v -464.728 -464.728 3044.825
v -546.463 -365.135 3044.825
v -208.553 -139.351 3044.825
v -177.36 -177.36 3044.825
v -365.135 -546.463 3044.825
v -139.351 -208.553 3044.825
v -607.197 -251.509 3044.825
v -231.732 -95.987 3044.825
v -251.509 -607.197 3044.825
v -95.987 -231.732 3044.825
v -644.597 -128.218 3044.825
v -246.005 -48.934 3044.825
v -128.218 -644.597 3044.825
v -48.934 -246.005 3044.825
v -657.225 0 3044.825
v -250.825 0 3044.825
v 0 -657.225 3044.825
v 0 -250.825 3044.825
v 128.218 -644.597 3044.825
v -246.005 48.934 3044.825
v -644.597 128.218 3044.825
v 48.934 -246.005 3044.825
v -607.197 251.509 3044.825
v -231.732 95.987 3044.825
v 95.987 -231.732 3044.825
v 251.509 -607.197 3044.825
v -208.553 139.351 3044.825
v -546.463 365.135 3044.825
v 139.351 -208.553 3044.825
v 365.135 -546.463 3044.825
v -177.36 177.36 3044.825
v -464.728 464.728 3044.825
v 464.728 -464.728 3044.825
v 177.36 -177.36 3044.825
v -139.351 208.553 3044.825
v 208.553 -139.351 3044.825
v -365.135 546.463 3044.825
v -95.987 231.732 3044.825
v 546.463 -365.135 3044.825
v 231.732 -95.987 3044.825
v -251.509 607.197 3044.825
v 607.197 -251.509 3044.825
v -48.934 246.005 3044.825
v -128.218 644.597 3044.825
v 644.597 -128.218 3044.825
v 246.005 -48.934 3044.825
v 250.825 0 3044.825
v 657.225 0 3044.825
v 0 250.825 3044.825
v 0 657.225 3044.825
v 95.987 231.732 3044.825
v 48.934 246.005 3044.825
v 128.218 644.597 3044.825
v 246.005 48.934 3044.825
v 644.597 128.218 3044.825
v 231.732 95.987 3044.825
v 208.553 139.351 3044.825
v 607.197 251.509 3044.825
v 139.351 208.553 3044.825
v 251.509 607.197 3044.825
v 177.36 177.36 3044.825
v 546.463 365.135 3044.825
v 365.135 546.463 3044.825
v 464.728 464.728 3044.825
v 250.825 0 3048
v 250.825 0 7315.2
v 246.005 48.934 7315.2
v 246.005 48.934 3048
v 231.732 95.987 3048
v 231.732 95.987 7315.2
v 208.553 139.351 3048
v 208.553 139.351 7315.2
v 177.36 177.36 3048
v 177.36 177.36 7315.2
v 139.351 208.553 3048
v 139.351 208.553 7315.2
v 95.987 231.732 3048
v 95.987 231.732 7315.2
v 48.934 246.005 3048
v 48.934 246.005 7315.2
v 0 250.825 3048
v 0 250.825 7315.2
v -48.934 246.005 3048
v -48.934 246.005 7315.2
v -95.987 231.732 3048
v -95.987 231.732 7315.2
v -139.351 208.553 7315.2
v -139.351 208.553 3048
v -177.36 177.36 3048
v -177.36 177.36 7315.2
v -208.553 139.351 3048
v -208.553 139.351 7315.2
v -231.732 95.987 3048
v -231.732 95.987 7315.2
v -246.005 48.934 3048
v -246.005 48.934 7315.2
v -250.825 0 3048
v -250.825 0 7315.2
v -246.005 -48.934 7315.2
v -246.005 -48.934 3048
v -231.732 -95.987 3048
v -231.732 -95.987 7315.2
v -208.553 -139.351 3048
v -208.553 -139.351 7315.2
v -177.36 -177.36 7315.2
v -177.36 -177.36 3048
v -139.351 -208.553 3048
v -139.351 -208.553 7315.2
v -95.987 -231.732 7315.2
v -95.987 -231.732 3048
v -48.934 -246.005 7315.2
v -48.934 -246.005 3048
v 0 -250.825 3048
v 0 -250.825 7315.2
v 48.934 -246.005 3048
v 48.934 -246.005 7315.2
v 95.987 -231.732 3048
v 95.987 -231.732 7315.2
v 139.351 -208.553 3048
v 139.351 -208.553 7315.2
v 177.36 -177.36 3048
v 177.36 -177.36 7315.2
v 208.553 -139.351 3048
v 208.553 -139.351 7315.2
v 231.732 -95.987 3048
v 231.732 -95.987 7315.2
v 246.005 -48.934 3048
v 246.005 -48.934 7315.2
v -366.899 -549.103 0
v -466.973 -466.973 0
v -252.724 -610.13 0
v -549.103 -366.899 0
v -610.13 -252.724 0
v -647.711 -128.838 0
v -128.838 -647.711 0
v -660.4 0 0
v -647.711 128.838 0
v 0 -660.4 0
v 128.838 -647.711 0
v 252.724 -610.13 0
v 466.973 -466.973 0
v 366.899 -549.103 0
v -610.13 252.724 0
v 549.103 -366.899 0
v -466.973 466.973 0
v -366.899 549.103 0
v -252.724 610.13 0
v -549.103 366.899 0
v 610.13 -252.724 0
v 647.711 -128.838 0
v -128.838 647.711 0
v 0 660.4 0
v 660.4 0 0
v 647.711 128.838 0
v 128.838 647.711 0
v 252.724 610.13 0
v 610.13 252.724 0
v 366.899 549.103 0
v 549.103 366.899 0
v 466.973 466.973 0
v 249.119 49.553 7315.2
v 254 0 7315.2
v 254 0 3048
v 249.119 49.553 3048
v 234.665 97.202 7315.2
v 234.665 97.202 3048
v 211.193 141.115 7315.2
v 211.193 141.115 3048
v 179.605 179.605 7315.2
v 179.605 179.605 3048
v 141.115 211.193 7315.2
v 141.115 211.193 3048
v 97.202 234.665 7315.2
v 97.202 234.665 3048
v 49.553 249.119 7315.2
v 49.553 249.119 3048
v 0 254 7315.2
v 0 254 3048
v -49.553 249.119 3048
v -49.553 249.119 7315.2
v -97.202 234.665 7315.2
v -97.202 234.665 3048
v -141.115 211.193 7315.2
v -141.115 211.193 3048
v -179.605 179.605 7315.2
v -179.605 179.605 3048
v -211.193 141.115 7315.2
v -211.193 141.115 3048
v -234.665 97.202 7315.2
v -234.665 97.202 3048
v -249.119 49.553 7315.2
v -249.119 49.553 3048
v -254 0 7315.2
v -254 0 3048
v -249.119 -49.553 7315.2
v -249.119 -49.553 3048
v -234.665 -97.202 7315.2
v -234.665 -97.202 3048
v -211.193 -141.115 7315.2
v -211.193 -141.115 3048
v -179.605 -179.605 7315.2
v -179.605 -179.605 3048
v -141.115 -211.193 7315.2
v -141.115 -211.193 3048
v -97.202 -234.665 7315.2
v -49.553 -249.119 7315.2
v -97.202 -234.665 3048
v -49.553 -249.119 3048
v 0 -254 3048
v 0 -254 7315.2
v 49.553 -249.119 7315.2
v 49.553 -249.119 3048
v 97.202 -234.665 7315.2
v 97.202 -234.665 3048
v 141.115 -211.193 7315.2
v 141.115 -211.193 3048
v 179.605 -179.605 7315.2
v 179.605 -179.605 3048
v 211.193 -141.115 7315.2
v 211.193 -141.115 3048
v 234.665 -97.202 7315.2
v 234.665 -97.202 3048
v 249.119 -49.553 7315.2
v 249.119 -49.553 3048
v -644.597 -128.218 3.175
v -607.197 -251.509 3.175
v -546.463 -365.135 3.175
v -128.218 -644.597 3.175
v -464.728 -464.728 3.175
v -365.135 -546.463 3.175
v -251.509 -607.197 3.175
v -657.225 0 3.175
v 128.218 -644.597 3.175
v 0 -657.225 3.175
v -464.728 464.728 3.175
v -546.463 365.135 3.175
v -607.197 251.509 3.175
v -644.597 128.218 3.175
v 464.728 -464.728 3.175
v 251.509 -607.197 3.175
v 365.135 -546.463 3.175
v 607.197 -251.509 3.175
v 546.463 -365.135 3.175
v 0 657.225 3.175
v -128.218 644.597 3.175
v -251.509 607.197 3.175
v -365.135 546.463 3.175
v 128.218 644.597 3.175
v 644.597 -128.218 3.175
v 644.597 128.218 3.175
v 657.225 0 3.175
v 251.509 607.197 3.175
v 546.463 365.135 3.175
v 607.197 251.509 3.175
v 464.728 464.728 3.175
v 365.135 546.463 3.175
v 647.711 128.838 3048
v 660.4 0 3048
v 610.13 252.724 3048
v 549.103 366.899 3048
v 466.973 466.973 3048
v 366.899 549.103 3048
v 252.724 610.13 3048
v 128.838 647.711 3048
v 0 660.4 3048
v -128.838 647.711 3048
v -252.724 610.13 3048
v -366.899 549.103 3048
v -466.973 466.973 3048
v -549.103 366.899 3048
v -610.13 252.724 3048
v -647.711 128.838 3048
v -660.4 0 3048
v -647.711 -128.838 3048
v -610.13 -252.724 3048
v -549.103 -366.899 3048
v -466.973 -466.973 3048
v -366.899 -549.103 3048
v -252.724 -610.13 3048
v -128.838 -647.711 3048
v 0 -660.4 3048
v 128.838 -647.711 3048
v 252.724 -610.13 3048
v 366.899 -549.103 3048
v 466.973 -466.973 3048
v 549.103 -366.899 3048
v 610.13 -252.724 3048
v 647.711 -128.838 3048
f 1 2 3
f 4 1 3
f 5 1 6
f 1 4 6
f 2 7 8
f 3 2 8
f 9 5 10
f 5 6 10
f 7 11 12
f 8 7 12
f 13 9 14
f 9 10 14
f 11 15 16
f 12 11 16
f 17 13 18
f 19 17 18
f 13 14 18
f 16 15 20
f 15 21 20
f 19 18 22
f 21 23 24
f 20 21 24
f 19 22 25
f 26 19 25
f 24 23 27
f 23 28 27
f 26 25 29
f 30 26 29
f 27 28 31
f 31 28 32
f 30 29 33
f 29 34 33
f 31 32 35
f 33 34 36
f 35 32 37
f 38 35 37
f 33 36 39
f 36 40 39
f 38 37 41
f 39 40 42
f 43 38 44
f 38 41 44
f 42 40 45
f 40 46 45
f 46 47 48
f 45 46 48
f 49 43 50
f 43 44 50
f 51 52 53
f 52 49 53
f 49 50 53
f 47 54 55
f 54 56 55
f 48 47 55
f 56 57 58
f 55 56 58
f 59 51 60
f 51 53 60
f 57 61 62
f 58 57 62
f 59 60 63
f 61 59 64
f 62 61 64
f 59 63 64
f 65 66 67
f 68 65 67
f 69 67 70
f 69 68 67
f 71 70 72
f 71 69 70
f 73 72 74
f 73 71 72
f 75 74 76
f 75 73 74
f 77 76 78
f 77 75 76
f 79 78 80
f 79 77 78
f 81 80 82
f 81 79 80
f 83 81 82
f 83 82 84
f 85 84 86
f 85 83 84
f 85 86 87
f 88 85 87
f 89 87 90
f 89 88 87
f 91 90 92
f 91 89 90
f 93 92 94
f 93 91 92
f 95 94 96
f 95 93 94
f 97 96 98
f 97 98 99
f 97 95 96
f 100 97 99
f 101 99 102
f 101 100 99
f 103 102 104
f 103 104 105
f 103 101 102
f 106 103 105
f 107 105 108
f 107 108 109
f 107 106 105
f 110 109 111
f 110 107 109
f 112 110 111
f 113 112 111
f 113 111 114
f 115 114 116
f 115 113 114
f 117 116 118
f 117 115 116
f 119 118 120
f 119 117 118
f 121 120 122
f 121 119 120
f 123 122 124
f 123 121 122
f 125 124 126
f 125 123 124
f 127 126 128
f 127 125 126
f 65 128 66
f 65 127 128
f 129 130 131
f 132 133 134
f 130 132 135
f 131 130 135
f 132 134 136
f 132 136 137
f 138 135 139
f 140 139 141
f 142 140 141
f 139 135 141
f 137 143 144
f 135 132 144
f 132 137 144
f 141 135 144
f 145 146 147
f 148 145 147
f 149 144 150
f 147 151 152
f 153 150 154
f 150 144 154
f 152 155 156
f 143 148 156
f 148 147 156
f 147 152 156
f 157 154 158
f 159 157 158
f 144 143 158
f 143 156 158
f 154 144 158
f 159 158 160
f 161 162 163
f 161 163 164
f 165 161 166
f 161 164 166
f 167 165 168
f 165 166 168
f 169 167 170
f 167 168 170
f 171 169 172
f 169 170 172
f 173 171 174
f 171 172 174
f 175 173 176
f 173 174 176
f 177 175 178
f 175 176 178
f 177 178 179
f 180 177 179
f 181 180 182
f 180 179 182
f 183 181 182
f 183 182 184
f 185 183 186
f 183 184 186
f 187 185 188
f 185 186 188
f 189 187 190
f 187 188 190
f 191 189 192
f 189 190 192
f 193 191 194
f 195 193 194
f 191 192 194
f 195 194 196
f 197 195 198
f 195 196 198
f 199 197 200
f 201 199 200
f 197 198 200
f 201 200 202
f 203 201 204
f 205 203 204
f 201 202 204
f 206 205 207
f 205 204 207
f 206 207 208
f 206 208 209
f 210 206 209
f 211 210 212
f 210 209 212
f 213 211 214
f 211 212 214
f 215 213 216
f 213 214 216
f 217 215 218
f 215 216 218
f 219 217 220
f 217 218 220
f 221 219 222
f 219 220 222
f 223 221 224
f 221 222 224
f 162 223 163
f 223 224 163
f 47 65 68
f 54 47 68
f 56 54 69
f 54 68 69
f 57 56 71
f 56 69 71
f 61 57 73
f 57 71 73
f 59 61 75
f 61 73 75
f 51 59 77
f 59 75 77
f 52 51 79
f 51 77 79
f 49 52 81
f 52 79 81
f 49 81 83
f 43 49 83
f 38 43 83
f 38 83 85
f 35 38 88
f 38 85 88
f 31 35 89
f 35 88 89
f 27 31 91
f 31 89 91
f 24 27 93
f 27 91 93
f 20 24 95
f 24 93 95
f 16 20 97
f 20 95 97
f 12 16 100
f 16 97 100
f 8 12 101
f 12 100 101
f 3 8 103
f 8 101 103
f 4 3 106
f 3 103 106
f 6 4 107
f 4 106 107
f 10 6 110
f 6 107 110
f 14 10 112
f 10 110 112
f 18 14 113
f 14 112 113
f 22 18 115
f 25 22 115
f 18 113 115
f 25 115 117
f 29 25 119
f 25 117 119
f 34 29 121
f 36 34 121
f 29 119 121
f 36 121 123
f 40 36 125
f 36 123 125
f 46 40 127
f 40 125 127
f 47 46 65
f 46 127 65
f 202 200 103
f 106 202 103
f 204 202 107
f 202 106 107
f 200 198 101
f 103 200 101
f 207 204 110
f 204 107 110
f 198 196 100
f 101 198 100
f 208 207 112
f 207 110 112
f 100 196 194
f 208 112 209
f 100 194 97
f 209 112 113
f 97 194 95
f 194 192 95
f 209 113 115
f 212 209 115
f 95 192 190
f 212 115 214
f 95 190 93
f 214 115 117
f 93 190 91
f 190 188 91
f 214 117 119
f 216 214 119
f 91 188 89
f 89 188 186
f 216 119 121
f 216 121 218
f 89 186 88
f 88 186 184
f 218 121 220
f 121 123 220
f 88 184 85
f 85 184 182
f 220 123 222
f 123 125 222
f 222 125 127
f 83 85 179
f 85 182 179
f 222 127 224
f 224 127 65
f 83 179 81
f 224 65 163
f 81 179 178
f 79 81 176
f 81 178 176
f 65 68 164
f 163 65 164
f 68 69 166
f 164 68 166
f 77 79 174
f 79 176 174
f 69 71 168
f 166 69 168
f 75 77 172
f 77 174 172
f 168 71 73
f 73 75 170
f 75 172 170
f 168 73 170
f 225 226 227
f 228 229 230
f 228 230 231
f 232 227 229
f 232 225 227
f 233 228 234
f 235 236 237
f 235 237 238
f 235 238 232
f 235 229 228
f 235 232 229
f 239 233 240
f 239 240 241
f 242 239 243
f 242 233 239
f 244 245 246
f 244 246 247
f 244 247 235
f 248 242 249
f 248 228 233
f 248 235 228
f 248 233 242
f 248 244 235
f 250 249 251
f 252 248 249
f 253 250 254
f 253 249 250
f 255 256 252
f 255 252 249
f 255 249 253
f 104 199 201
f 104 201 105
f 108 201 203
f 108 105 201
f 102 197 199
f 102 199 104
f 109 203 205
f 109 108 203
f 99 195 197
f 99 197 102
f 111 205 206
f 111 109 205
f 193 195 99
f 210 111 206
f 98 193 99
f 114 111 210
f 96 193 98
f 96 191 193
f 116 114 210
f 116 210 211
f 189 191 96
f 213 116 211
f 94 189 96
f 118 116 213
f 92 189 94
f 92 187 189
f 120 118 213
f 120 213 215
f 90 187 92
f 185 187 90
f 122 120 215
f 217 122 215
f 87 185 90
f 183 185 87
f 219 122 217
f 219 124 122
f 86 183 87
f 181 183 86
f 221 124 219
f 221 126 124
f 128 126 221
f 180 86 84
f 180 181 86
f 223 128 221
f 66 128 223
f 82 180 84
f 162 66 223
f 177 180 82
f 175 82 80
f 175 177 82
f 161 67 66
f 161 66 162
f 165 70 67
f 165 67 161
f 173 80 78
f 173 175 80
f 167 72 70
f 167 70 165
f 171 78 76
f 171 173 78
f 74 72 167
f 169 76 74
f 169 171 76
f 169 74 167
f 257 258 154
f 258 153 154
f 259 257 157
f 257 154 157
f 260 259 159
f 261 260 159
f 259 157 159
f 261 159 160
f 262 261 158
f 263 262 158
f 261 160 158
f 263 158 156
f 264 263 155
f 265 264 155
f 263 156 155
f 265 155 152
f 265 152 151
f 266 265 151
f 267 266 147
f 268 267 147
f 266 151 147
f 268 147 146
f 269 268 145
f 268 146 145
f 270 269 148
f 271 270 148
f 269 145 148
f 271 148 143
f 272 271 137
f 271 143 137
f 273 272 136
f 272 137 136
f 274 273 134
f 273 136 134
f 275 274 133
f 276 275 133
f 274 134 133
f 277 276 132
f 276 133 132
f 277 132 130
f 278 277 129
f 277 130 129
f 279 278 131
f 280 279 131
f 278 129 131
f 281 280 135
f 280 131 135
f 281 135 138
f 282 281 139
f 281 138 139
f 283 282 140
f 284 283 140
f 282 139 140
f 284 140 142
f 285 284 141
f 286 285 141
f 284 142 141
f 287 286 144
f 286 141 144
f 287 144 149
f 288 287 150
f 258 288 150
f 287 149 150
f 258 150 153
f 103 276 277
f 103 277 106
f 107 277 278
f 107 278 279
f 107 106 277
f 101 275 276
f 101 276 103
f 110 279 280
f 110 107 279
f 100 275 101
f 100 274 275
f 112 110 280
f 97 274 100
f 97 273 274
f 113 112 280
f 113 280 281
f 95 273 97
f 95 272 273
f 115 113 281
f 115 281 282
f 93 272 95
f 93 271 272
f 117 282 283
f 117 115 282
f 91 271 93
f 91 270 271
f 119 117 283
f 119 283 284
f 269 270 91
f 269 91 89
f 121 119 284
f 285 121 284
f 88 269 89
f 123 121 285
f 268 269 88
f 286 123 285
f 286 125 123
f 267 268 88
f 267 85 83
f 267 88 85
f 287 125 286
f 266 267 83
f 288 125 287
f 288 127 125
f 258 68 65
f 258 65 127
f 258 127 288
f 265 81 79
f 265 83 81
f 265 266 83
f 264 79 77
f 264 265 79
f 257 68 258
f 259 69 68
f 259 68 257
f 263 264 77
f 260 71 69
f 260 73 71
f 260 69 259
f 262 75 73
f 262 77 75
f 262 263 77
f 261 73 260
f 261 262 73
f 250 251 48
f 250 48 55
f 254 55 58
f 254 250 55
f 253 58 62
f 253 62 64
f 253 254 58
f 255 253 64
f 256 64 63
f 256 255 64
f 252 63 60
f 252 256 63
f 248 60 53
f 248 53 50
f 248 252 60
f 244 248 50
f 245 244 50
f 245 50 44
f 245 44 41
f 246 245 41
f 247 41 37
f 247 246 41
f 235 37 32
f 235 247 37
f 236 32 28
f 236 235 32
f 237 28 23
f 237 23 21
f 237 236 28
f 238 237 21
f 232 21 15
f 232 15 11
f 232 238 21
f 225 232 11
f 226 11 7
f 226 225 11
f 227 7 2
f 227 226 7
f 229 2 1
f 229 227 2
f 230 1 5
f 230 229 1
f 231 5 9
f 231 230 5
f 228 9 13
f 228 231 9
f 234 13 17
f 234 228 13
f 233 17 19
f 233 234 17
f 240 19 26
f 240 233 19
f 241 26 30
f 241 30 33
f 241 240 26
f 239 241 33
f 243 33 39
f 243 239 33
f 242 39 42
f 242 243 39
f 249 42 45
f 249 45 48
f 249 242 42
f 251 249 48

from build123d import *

# Parameters (mm, degrees)
F0_R     = 660.4
F1_DEPTH = 3.175
F2_R     = 660.4
F2_R_2   = 657.225
F3_DEPTH = 3041.65
F4_R     = 660.4
F4_R_2   = 657.225
F5_DEPTH = 3.175
F6_R     = 250.825
F7_DEPTH = 3.175
F6_R_2   = 254
F8_DEPTH = 4267.2


with BuildPart() as f1:
    # F0 (on Top) → F1 (new body)
    with BuildSketch(Plane.XY):
        Circle(F0_R)
    extrude(amount=F1_DEPTH)

    # F2 (on face) → F3 (join)
    with BuildSketch(Plane.XY.offset(3.175)):
        Circle(F2_R)
        Circle(F2_R_2, mode=Mode.SUBTRACT)
    extrude(amount=F3_DEPTH)

    # F4 (on face) → F5 (join)
    with BuildSketch(Plane.XY.offset(3044.825)):
        Circle(F4_R)
        Circle(F4_R_2, mode=Mode.SUBTRACT)
        Circle(F4_R_2)
    extrude(amount=F5_DEPTH)

    # F6 (on face) → F7 (cut, through all)
    with BuildSketch(Plane.XY.offset(3048)):
        Circle(F6_R)
    extrude(amount=-F7_DEPTH, mode=Mode.SUBTRACT)


with BuildPart() as f8:
    # F6 (on face) → F8 (new body)
    with BuildSketch(Plane.XY.offset(3048)):
        Circle(F6_R_2)
        Circle(F6_R, mode=Mode.SUBTRACT)
    extrude(amount=F8_DEPTH)


solid = Compound([f1.part, f8.part])
